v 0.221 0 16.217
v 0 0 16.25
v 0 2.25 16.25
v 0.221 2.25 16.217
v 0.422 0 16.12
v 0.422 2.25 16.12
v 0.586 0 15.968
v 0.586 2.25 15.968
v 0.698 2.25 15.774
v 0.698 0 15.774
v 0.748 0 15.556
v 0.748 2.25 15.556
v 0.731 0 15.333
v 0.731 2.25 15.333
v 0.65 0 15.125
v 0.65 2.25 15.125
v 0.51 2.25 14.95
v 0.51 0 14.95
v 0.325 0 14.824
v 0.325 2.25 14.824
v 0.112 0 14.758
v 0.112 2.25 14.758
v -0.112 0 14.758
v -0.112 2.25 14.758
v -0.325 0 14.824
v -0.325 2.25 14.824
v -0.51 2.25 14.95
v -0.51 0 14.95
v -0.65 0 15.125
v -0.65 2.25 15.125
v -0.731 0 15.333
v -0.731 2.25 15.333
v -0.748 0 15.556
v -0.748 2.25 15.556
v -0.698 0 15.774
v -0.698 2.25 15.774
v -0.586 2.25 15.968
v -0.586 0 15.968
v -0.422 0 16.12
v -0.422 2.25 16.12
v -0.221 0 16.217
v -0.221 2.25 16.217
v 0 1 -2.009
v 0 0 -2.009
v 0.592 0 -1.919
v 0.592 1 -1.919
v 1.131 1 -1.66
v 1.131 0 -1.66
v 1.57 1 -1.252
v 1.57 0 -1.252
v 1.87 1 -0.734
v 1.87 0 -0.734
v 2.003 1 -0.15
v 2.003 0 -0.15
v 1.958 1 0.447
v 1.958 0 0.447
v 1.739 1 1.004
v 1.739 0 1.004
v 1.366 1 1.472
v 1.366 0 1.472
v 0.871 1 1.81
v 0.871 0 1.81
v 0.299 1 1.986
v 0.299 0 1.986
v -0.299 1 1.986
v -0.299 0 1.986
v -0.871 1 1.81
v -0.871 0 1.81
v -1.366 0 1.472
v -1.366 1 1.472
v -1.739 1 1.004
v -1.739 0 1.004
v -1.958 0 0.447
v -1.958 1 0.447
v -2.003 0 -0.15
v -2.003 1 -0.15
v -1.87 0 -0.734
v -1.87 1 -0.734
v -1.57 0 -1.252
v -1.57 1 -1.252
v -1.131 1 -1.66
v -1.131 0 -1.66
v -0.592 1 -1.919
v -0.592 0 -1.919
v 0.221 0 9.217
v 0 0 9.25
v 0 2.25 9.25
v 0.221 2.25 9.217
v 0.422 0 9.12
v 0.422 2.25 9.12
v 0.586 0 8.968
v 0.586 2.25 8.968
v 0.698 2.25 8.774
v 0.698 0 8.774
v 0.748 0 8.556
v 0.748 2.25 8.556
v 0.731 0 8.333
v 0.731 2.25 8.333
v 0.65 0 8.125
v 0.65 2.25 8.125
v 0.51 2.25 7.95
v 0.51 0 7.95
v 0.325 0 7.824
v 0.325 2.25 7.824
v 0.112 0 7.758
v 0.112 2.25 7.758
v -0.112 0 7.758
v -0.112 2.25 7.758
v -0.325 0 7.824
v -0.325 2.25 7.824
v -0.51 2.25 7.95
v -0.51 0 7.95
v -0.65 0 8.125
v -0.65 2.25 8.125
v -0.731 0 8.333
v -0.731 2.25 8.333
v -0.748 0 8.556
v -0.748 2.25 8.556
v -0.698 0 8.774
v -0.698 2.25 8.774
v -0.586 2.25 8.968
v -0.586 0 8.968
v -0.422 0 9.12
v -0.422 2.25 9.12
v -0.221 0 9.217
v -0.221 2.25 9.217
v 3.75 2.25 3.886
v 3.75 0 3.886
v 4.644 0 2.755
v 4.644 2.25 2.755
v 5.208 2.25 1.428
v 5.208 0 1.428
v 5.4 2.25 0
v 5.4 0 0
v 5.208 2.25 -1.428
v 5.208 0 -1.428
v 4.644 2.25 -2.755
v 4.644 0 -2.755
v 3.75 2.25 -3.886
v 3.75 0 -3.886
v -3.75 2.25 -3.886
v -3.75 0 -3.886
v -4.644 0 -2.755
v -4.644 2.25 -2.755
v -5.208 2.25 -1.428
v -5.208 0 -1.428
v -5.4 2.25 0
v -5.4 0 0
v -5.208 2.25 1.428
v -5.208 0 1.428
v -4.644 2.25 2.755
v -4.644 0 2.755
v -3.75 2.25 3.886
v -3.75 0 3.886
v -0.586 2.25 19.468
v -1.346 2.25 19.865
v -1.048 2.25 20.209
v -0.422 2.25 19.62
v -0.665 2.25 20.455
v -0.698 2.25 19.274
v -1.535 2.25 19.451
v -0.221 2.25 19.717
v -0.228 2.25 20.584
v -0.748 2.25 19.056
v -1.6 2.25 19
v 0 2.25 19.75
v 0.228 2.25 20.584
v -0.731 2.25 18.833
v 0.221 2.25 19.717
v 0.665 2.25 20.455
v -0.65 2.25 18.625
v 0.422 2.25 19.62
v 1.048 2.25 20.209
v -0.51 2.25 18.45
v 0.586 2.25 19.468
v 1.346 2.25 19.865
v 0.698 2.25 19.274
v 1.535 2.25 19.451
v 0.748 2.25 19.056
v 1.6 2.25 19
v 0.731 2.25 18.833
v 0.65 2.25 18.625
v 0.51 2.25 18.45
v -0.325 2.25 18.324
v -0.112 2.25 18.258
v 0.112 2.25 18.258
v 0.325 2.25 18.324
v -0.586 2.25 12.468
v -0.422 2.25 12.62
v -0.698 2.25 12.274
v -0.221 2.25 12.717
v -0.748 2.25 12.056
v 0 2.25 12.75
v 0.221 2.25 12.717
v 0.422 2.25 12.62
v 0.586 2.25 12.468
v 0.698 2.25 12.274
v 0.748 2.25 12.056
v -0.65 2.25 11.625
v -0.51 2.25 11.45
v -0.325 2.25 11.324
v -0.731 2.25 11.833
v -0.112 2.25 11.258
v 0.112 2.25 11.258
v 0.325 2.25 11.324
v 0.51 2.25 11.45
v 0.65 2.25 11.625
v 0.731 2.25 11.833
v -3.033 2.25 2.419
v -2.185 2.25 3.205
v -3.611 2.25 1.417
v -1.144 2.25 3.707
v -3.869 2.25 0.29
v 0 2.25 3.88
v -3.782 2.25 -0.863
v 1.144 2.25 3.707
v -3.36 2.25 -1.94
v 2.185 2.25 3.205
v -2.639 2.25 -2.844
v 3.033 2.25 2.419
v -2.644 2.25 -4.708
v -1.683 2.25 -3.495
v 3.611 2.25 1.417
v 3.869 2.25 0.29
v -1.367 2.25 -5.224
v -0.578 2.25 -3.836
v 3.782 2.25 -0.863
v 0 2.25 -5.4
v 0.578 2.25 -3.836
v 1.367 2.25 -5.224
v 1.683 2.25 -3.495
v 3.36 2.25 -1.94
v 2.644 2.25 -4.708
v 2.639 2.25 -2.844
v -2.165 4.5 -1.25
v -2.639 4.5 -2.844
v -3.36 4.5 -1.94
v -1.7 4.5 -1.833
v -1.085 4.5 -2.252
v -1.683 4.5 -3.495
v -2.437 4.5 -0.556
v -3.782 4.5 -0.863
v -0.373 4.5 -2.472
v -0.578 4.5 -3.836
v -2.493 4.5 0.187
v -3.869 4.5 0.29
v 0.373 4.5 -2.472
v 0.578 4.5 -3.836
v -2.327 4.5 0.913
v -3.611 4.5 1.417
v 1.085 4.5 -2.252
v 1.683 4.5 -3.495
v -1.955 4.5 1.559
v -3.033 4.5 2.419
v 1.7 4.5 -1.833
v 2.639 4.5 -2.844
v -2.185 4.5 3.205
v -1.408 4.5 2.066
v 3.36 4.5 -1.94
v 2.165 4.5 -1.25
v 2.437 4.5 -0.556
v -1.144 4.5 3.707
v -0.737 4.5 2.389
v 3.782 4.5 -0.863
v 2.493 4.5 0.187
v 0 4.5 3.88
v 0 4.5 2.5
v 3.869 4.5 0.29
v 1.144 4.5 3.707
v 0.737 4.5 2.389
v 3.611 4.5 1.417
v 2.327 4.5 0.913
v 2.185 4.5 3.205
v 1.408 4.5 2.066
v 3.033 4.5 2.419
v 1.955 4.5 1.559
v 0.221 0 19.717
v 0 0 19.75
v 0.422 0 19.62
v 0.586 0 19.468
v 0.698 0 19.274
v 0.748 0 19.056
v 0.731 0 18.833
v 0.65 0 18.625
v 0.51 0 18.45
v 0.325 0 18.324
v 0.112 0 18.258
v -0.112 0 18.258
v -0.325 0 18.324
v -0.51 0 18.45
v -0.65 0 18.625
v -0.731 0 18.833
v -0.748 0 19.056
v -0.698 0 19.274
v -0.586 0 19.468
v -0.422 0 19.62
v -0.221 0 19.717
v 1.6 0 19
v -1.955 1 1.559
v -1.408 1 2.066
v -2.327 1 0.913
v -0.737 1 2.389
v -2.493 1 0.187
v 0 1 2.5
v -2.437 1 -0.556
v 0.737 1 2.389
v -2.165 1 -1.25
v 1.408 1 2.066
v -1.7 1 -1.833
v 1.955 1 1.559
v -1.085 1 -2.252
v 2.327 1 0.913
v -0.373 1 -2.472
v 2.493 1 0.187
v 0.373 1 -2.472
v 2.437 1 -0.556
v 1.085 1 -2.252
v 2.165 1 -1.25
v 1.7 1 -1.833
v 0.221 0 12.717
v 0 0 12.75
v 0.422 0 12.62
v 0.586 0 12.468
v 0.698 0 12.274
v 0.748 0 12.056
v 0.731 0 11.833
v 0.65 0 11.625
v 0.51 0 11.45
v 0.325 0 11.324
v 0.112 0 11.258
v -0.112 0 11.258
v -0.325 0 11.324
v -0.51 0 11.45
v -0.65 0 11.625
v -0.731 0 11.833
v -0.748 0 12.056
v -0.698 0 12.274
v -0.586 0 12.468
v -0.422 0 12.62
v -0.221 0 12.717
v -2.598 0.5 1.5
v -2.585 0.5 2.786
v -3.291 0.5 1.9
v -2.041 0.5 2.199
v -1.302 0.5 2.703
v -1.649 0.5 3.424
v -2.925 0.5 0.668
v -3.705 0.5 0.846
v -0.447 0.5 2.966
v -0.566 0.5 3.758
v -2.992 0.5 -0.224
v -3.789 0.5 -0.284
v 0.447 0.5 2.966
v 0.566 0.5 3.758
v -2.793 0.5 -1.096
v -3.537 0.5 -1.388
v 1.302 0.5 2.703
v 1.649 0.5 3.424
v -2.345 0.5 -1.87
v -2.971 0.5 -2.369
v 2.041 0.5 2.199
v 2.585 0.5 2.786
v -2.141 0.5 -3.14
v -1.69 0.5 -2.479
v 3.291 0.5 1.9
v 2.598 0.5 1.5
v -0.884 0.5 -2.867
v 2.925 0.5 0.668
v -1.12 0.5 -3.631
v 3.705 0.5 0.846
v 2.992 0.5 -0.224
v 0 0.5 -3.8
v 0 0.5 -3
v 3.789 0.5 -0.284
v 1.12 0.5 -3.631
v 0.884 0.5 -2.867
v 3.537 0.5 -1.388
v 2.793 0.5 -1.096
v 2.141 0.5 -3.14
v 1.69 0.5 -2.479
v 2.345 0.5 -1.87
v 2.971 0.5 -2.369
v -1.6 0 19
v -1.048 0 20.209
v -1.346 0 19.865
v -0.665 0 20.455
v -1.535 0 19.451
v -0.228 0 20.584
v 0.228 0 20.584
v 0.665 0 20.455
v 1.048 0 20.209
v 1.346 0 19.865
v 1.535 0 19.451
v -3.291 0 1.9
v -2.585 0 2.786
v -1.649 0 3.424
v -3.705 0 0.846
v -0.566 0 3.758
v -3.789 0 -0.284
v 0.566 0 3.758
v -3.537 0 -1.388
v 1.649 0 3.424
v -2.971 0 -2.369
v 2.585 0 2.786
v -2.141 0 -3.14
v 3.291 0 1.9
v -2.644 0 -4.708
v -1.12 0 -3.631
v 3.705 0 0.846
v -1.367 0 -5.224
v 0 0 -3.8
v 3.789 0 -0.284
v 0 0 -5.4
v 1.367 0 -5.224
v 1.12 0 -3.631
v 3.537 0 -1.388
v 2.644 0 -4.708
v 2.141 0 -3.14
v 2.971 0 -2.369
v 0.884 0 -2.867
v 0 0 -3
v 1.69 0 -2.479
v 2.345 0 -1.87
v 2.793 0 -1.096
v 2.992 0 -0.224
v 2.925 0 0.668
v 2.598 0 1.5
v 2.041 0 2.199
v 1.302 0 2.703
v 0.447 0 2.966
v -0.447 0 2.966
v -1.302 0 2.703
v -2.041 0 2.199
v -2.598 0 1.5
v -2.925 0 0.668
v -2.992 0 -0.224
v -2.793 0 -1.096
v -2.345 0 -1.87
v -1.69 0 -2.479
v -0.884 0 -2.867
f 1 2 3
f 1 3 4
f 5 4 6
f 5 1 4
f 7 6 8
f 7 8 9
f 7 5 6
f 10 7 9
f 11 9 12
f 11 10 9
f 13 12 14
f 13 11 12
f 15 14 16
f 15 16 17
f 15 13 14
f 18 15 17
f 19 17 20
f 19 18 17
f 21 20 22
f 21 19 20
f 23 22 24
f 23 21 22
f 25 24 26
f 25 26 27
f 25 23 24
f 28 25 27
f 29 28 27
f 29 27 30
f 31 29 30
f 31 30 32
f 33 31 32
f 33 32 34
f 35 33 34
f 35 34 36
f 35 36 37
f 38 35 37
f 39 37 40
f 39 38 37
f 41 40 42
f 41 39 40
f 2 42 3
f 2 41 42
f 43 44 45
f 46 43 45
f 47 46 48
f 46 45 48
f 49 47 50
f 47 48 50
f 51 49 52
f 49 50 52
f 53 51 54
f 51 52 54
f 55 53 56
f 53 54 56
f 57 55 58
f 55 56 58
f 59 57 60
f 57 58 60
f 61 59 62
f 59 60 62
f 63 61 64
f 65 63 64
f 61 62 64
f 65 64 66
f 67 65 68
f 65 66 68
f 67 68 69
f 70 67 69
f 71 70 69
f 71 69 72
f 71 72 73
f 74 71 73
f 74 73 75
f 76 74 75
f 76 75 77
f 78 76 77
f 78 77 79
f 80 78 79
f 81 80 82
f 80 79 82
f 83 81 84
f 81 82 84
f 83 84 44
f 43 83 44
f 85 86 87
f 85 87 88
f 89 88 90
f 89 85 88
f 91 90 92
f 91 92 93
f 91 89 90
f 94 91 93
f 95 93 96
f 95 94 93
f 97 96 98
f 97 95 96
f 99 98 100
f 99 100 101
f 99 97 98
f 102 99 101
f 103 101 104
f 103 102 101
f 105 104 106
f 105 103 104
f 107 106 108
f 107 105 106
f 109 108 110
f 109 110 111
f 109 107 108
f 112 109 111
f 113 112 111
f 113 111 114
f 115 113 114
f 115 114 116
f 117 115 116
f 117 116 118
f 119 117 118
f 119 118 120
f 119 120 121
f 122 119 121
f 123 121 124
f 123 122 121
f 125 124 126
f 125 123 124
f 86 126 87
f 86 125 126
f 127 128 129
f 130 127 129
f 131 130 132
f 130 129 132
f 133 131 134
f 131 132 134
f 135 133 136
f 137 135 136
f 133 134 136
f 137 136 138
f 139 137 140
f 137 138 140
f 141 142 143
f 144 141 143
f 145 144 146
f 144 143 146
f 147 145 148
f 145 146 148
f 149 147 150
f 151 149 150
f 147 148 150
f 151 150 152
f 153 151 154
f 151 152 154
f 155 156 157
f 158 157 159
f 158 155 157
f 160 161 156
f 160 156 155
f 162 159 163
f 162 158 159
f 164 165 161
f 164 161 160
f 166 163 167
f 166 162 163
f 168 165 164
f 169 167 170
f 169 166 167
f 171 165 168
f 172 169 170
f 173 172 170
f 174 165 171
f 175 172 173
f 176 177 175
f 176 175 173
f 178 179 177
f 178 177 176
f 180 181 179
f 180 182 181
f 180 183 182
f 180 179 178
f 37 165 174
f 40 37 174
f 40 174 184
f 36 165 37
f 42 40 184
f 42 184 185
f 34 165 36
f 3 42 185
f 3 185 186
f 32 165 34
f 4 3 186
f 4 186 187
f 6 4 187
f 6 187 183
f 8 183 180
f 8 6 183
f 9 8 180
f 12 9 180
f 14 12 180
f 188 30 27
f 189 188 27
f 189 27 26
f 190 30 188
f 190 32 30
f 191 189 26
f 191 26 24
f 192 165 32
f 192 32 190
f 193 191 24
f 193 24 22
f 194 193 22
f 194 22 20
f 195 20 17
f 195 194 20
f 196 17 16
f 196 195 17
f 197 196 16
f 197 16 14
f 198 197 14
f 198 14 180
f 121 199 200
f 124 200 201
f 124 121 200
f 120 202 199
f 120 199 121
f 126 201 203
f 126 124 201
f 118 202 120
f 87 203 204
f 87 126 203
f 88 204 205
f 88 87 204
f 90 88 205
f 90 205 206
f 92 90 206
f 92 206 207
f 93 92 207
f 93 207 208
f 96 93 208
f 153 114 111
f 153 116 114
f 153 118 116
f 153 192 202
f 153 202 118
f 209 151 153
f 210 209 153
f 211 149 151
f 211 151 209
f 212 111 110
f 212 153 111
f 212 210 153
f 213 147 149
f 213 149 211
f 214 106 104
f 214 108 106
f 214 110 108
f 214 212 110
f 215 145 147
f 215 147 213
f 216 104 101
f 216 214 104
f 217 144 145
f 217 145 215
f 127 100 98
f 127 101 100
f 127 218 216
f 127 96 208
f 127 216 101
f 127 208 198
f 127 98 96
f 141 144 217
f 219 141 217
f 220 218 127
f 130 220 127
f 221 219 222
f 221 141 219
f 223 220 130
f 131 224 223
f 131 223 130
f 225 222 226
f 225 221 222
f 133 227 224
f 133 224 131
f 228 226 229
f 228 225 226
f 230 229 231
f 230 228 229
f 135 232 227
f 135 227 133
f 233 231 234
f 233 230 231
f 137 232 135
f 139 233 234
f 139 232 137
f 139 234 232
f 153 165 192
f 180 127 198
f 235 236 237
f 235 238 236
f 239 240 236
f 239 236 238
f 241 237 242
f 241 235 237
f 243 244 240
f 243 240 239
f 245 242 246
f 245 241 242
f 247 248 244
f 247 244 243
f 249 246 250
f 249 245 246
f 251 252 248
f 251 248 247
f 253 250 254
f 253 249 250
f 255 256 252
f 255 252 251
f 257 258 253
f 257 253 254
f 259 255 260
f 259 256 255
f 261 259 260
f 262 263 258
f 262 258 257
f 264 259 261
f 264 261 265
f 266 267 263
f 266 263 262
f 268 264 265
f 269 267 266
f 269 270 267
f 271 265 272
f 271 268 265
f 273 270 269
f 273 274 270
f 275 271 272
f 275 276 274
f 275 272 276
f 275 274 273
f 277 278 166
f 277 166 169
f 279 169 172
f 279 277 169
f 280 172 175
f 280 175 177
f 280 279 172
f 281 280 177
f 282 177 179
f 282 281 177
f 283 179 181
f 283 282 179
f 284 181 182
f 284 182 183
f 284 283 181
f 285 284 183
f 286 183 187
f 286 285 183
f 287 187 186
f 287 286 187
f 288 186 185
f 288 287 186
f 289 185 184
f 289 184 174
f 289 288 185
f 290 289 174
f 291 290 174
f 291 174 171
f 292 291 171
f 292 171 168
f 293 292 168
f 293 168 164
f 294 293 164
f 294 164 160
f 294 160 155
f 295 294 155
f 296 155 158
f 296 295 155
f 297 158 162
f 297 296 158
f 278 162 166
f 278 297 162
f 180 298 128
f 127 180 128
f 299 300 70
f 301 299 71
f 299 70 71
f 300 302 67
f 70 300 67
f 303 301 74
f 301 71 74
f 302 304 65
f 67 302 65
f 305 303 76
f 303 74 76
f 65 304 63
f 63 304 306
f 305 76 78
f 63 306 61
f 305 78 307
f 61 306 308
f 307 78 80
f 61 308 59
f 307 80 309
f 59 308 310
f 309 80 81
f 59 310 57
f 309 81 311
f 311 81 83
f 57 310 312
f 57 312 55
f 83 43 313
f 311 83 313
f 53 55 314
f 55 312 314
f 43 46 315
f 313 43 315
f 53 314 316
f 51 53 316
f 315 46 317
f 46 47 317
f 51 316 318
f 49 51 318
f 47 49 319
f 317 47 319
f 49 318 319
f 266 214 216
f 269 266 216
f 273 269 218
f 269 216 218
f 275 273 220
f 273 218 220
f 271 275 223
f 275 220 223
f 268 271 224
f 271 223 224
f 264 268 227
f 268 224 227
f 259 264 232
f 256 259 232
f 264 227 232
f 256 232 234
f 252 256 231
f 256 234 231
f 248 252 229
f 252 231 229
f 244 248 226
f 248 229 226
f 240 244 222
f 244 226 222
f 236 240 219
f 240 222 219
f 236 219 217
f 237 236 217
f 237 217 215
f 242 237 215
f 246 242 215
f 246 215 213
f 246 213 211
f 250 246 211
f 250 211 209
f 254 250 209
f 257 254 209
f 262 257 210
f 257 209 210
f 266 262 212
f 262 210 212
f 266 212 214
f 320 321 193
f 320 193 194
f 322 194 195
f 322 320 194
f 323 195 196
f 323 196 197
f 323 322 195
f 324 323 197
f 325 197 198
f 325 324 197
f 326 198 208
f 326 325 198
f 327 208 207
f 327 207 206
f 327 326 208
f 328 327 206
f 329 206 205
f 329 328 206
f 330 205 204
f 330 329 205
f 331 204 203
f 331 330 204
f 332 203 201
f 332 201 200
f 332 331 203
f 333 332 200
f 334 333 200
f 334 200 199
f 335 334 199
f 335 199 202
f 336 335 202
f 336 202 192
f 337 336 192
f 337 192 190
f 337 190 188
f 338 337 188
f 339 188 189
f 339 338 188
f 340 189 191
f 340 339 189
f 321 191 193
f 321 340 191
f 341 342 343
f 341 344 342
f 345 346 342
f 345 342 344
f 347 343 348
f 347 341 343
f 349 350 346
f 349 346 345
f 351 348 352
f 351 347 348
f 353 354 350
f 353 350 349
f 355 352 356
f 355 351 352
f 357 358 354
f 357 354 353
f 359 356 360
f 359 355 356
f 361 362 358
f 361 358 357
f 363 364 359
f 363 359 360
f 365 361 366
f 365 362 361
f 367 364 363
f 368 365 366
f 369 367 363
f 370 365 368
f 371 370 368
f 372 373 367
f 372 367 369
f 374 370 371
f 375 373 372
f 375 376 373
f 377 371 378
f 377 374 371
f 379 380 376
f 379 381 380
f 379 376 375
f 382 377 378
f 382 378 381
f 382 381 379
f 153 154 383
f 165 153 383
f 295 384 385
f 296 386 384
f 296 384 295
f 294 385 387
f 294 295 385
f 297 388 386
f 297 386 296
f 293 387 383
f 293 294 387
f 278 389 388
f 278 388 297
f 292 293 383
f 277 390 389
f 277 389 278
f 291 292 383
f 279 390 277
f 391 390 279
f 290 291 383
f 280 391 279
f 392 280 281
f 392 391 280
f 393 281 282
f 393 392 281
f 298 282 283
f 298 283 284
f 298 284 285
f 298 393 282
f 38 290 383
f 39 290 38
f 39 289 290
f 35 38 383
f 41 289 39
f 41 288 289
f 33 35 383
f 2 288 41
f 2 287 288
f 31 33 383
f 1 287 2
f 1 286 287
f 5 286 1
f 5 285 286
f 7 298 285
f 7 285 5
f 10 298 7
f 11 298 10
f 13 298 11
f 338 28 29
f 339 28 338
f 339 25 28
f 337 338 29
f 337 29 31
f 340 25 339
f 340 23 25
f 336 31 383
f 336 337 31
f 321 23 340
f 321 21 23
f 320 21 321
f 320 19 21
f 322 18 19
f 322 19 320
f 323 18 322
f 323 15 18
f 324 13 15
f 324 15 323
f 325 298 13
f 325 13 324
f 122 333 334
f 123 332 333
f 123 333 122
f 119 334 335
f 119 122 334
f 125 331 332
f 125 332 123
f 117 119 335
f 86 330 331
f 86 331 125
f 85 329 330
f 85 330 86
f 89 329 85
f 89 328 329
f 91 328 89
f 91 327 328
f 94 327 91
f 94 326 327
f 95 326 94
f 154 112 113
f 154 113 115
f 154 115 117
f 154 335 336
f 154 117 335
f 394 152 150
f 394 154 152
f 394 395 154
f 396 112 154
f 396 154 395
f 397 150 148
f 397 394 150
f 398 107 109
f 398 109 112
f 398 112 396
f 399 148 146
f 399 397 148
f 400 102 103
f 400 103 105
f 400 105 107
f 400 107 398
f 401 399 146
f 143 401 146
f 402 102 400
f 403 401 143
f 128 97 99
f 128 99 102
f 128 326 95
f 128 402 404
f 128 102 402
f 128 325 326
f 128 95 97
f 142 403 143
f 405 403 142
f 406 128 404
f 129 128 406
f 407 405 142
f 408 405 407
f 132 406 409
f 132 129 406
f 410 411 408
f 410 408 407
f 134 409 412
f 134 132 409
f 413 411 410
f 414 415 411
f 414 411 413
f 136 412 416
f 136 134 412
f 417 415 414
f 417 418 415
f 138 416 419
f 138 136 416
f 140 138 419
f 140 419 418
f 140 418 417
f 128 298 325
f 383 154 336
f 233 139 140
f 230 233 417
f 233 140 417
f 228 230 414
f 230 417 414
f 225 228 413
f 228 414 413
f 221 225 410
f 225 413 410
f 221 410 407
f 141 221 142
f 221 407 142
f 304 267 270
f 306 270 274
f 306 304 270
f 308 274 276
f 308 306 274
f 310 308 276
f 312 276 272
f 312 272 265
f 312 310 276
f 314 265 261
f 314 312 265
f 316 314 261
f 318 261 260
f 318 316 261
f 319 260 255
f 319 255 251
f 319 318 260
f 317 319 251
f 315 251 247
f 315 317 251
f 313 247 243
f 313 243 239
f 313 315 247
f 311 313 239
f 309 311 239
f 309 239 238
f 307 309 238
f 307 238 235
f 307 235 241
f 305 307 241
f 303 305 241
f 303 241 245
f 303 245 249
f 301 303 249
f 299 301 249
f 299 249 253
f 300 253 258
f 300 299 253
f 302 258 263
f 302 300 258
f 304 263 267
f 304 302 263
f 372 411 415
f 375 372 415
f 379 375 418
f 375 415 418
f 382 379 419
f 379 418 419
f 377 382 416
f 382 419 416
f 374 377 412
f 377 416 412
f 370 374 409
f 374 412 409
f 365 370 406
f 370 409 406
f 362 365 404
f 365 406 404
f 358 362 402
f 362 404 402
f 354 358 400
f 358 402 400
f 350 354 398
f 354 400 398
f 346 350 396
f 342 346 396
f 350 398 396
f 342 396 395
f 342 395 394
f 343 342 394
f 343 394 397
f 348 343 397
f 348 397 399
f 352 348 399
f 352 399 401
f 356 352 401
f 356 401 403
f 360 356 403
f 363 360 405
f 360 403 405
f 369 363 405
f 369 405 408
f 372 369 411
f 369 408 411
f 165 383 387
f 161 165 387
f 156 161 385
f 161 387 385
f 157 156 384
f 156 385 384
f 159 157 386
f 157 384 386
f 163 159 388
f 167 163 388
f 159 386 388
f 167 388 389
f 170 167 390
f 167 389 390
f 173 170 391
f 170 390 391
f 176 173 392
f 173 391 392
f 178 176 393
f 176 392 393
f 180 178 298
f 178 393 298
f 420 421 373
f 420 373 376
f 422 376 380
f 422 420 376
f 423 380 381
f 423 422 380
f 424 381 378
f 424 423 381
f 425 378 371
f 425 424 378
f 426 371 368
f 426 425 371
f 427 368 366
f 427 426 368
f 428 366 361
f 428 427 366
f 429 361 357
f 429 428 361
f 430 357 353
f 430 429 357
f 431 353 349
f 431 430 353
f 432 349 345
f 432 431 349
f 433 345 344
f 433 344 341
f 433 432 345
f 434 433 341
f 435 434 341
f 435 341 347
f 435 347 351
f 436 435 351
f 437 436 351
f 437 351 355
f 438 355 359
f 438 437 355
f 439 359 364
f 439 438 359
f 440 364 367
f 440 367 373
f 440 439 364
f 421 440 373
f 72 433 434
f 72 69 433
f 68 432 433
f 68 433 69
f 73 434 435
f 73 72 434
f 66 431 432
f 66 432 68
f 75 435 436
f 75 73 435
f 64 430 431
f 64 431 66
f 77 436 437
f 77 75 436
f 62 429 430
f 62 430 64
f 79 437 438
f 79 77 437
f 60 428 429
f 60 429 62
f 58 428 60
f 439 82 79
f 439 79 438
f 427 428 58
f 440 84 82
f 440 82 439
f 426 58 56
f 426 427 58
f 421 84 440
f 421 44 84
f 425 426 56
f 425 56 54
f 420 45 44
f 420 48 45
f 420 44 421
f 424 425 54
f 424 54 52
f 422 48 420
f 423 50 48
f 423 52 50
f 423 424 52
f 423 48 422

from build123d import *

# Parameters (mm, degrees)
SKETCH1_R           = 2.5
SKETCH1_R_2         = 0.75
BOSS_EXTRUDE1_DEPTH = 2.25
SKETCH2_R           = 3.879501895
SKETCH2_R_2         = 2.5
BOSS_EXTRUDE2_DEPTH = 2.25
SKETCH3_R           = 2.5
SKETCH3_R_2         = 2.008527967
BOSS_EXTRUDE3_DEPTH = 1
SKETCH4_R           = 3.8
SKETCH4_R_2         = 3
CUT_EXTRUDE1_DEPTH  = 0.5
CUT_EXTRUDE2_DEPTH  = 22.766258291


with BuildPart() as part:
    # Sketch1 → Boss-Extrude1 (new body)
    with BuildSketch(Plane(origin=(0, 0, 0), x_dir=(1, 0, 0), z_dir=(0, 1, 0))):
        with BuildLine():
            Line((-1.6, 19), (-3.75, 3.885550154))
            ThreePointArc((-3.75, 3.885550154), (-5.4, 0), (-3.75, -3.885550154))
            Line((-3.75, -3.885550154), (-1.6, -19))
            ThreePointArc((-1.6, -19), (0, -20.6), (1.6, -19))
            Line((1.6, -19), (3.75, -3.885550154))
            ThreePointArc((3.75, -3.885550154), (5.4, 0), (3.75, 3.885550154))
            Line((3.75, 3.885550154), (1.6, 19))
            ThreePointArc((1.6, 19), (0, 20.6), (-1.6, 19))
        make_face()
        with Locations(Location((0, 0, 0), (0, 0, 270))):
            Circle(SKETCH1_R, mode=Mode.SUBTRACT)
        with Locations(Location((0, -19, 0), (0, 0, 270))):
            Circle(SKETCH1_R_2, mode=Mode.SUBTRACT)
        with Locations(Location((0, 19, 0), (0, 0, 270))):
            Circle(SKETCH1_R_2, mode=Mode.SUBTRACT)
        with Locations(Location((0, 15.5, 0), (0, 0, 270))):
            Circle(SKETCH1_R_2, mode=Mode.SUBTRACT)
        with Locations(Location((0, 12, 0), (0, 0, 270))):
            Circle(SKETCH1_R_2, mode=Mode.SUBTRACT)
        with Locations(Location((0, 8.5, 0), (0, 0, 270))):
            Circle(SKETCH1_R_2, mode=Mode.SUBTRACT)
        with Locations(Location((0, -15.5, 0), (0, 0, 270))):
            Circle(SKETCH1_R_2, mode=Mode.SUBTRACT)
        with Locations(Location((0, -12, 0), (0, 0, 270))):
            Circle(SKETCH1_R_2, mode=Mode.SUBTRACT)
        with Locations(Location((0, -8.5, 0), (0, 0, 270))):
            Circle(SKETCH1_R_2, mode=Mode.SUBTRACT)
    extrude(amount=BOSS_EXTRUDE1_DEPTH)

    # Sketch2 → Boss-Extrude2 (add)
    with BuildSketch(Plane(origin=(0, 2.25, 0), x_dir=(1, 0, 0), z_dir=(0, 1, 0))):
        with Locations(Location((0, 0, 0), (0, 0, 270))):
            Circle(SKETCH2_R)
        with Locations(Location((0, 0, 0), (0, 0, 270))):
            Circle(SKETCH2_R_2, mode=Mode.SUBTRACT)
    extrude(amount=BOSS_EXTRUDE2_DEPTH)

    # Sketch3 → Boss-Extrude3 (add)
    with BuildSketch(Plane.XZ):
        with Locations(Location((0, 0, 0), (0, 0, 270))):
            Circle(SKETCH3_R)
        with Locations(Location((0, 0, 0), (0, 0, 270))):
            Circle(SKETCH3_R_2, mode=Mode.SUBTRACT)
    extrude(amount=-BOSS_EXTRUDE3_DEPTH)

    # Sketch4 → Cut-Extrude1 (cut)
    with BuildSketch(Plane.XZ):
        with Locations(Location((0, 0, 0), (0, 0, 270))):
            Circle(SKETCH4_R)
        with Locations(Location((0, 0, 0), (0, 0, 270))):
            Circle(SKETCH4_R_2, mode=Mode.SUBTRACT)
    extrude(amount=-CUT_EXTRUDE1_DEPTH, mode=Mode.SUBTRACT)

    # Sketch5 → Cut-Extrude2 (cut, through all)
    with BuildSketch(Plane.XZ):
        with BuildLine():
            Line((-3.75, -3.885550154), (-1.6, -19))
            ThreePointArc((-1.6, -19), (0, -20.6), (1.6, -19))
            Line((1.6, -19), (3.75, -3.885550154))
            ThreePointArc((3.75, -3.885550154), (0, -5.4), (-3.75, -3.885550154))
        make_face()
    extrude(amount=-CUT_EXTRUDE2_DEPTH, mode=Mode.SUBTRACT)


solid = part.part
